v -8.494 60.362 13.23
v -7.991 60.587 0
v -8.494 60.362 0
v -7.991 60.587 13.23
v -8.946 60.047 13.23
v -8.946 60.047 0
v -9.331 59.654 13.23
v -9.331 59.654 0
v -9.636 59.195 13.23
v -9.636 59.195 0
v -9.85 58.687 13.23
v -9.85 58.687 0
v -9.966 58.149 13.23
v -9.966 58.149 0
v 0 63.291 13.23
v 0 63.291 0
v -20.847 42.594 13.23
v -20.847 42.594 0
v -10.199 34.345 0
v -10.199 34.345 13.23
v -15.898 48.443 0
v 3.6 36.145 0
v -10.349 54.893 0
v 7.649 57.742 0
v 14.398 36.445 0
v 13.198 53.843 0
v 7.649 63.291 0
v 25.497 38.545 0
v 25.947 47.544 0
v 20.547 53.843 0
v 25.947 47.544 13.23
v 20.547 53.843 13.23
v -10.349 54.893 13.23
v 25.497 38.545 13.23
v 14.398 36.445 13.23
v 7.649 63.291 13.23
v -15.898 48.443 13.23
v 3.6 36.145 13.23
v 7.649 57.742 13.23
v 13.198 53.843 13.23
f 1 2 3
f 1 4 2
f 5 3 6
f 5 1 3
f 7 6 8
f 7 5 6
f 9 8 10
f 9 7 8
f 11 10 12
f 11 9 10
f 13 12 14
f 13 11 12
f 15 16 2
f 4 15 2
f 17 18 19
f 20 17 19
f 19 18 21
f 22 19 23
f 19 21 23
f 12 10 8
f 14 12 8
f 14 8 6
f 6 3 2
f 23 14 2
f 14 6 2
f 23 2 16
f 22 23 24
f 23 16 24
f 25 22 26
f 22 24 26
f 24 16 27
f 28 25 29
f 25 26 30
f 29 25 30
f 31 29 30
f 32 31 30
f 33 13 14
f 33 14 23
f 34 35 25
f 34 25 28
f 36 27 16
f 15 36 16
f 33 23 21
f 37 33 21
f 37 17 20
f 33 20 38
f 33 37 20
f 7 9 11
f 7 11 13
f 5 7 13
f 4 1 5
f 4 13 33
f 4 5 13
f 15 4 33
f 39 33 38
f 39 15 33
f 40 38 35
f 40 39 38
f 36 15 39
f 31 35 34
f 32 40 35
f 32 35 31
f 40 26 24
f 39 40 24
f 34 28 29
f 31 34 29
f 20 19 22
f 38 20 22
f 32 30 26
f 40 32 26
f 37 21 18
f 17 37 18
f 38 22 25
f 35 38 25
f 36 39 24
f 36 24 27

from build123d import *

# Parameters (mm, degrees)
F1_DEPTH = 13.2296
F2_R     = 2.93654


with BuildPart() as f1:
    # F0 (on Top) → F1 (new body)
    with BuildSketch(Plane.XY):
        Polygon((7.648975, 63.29149), (0, 63.29149), (-9.748682, 59.991933), (-10.348603, 54.892614), (-15.89787, 48.443481), (-20.847201, 42.594269), (-10.198623, 34.345381), (3.59951, 36.145136), (14.398068, 36.445096), (25.496572, 38.544811), (25.946513, 47.5436), (20.547241, 53.842753), (13.198227, 53.842753), (7.648975, 57.742231), align=None)
    extrude(amount=F1_DEPTH)

    # F2
    f2_edges = [f1.edges().sort_by_distance(p)[0] for p in [
        (-9.748682, 59.991933, 6.6148),
    ]]
    fillet(f2_edges, radius=F2_R)


solid = f1.part
